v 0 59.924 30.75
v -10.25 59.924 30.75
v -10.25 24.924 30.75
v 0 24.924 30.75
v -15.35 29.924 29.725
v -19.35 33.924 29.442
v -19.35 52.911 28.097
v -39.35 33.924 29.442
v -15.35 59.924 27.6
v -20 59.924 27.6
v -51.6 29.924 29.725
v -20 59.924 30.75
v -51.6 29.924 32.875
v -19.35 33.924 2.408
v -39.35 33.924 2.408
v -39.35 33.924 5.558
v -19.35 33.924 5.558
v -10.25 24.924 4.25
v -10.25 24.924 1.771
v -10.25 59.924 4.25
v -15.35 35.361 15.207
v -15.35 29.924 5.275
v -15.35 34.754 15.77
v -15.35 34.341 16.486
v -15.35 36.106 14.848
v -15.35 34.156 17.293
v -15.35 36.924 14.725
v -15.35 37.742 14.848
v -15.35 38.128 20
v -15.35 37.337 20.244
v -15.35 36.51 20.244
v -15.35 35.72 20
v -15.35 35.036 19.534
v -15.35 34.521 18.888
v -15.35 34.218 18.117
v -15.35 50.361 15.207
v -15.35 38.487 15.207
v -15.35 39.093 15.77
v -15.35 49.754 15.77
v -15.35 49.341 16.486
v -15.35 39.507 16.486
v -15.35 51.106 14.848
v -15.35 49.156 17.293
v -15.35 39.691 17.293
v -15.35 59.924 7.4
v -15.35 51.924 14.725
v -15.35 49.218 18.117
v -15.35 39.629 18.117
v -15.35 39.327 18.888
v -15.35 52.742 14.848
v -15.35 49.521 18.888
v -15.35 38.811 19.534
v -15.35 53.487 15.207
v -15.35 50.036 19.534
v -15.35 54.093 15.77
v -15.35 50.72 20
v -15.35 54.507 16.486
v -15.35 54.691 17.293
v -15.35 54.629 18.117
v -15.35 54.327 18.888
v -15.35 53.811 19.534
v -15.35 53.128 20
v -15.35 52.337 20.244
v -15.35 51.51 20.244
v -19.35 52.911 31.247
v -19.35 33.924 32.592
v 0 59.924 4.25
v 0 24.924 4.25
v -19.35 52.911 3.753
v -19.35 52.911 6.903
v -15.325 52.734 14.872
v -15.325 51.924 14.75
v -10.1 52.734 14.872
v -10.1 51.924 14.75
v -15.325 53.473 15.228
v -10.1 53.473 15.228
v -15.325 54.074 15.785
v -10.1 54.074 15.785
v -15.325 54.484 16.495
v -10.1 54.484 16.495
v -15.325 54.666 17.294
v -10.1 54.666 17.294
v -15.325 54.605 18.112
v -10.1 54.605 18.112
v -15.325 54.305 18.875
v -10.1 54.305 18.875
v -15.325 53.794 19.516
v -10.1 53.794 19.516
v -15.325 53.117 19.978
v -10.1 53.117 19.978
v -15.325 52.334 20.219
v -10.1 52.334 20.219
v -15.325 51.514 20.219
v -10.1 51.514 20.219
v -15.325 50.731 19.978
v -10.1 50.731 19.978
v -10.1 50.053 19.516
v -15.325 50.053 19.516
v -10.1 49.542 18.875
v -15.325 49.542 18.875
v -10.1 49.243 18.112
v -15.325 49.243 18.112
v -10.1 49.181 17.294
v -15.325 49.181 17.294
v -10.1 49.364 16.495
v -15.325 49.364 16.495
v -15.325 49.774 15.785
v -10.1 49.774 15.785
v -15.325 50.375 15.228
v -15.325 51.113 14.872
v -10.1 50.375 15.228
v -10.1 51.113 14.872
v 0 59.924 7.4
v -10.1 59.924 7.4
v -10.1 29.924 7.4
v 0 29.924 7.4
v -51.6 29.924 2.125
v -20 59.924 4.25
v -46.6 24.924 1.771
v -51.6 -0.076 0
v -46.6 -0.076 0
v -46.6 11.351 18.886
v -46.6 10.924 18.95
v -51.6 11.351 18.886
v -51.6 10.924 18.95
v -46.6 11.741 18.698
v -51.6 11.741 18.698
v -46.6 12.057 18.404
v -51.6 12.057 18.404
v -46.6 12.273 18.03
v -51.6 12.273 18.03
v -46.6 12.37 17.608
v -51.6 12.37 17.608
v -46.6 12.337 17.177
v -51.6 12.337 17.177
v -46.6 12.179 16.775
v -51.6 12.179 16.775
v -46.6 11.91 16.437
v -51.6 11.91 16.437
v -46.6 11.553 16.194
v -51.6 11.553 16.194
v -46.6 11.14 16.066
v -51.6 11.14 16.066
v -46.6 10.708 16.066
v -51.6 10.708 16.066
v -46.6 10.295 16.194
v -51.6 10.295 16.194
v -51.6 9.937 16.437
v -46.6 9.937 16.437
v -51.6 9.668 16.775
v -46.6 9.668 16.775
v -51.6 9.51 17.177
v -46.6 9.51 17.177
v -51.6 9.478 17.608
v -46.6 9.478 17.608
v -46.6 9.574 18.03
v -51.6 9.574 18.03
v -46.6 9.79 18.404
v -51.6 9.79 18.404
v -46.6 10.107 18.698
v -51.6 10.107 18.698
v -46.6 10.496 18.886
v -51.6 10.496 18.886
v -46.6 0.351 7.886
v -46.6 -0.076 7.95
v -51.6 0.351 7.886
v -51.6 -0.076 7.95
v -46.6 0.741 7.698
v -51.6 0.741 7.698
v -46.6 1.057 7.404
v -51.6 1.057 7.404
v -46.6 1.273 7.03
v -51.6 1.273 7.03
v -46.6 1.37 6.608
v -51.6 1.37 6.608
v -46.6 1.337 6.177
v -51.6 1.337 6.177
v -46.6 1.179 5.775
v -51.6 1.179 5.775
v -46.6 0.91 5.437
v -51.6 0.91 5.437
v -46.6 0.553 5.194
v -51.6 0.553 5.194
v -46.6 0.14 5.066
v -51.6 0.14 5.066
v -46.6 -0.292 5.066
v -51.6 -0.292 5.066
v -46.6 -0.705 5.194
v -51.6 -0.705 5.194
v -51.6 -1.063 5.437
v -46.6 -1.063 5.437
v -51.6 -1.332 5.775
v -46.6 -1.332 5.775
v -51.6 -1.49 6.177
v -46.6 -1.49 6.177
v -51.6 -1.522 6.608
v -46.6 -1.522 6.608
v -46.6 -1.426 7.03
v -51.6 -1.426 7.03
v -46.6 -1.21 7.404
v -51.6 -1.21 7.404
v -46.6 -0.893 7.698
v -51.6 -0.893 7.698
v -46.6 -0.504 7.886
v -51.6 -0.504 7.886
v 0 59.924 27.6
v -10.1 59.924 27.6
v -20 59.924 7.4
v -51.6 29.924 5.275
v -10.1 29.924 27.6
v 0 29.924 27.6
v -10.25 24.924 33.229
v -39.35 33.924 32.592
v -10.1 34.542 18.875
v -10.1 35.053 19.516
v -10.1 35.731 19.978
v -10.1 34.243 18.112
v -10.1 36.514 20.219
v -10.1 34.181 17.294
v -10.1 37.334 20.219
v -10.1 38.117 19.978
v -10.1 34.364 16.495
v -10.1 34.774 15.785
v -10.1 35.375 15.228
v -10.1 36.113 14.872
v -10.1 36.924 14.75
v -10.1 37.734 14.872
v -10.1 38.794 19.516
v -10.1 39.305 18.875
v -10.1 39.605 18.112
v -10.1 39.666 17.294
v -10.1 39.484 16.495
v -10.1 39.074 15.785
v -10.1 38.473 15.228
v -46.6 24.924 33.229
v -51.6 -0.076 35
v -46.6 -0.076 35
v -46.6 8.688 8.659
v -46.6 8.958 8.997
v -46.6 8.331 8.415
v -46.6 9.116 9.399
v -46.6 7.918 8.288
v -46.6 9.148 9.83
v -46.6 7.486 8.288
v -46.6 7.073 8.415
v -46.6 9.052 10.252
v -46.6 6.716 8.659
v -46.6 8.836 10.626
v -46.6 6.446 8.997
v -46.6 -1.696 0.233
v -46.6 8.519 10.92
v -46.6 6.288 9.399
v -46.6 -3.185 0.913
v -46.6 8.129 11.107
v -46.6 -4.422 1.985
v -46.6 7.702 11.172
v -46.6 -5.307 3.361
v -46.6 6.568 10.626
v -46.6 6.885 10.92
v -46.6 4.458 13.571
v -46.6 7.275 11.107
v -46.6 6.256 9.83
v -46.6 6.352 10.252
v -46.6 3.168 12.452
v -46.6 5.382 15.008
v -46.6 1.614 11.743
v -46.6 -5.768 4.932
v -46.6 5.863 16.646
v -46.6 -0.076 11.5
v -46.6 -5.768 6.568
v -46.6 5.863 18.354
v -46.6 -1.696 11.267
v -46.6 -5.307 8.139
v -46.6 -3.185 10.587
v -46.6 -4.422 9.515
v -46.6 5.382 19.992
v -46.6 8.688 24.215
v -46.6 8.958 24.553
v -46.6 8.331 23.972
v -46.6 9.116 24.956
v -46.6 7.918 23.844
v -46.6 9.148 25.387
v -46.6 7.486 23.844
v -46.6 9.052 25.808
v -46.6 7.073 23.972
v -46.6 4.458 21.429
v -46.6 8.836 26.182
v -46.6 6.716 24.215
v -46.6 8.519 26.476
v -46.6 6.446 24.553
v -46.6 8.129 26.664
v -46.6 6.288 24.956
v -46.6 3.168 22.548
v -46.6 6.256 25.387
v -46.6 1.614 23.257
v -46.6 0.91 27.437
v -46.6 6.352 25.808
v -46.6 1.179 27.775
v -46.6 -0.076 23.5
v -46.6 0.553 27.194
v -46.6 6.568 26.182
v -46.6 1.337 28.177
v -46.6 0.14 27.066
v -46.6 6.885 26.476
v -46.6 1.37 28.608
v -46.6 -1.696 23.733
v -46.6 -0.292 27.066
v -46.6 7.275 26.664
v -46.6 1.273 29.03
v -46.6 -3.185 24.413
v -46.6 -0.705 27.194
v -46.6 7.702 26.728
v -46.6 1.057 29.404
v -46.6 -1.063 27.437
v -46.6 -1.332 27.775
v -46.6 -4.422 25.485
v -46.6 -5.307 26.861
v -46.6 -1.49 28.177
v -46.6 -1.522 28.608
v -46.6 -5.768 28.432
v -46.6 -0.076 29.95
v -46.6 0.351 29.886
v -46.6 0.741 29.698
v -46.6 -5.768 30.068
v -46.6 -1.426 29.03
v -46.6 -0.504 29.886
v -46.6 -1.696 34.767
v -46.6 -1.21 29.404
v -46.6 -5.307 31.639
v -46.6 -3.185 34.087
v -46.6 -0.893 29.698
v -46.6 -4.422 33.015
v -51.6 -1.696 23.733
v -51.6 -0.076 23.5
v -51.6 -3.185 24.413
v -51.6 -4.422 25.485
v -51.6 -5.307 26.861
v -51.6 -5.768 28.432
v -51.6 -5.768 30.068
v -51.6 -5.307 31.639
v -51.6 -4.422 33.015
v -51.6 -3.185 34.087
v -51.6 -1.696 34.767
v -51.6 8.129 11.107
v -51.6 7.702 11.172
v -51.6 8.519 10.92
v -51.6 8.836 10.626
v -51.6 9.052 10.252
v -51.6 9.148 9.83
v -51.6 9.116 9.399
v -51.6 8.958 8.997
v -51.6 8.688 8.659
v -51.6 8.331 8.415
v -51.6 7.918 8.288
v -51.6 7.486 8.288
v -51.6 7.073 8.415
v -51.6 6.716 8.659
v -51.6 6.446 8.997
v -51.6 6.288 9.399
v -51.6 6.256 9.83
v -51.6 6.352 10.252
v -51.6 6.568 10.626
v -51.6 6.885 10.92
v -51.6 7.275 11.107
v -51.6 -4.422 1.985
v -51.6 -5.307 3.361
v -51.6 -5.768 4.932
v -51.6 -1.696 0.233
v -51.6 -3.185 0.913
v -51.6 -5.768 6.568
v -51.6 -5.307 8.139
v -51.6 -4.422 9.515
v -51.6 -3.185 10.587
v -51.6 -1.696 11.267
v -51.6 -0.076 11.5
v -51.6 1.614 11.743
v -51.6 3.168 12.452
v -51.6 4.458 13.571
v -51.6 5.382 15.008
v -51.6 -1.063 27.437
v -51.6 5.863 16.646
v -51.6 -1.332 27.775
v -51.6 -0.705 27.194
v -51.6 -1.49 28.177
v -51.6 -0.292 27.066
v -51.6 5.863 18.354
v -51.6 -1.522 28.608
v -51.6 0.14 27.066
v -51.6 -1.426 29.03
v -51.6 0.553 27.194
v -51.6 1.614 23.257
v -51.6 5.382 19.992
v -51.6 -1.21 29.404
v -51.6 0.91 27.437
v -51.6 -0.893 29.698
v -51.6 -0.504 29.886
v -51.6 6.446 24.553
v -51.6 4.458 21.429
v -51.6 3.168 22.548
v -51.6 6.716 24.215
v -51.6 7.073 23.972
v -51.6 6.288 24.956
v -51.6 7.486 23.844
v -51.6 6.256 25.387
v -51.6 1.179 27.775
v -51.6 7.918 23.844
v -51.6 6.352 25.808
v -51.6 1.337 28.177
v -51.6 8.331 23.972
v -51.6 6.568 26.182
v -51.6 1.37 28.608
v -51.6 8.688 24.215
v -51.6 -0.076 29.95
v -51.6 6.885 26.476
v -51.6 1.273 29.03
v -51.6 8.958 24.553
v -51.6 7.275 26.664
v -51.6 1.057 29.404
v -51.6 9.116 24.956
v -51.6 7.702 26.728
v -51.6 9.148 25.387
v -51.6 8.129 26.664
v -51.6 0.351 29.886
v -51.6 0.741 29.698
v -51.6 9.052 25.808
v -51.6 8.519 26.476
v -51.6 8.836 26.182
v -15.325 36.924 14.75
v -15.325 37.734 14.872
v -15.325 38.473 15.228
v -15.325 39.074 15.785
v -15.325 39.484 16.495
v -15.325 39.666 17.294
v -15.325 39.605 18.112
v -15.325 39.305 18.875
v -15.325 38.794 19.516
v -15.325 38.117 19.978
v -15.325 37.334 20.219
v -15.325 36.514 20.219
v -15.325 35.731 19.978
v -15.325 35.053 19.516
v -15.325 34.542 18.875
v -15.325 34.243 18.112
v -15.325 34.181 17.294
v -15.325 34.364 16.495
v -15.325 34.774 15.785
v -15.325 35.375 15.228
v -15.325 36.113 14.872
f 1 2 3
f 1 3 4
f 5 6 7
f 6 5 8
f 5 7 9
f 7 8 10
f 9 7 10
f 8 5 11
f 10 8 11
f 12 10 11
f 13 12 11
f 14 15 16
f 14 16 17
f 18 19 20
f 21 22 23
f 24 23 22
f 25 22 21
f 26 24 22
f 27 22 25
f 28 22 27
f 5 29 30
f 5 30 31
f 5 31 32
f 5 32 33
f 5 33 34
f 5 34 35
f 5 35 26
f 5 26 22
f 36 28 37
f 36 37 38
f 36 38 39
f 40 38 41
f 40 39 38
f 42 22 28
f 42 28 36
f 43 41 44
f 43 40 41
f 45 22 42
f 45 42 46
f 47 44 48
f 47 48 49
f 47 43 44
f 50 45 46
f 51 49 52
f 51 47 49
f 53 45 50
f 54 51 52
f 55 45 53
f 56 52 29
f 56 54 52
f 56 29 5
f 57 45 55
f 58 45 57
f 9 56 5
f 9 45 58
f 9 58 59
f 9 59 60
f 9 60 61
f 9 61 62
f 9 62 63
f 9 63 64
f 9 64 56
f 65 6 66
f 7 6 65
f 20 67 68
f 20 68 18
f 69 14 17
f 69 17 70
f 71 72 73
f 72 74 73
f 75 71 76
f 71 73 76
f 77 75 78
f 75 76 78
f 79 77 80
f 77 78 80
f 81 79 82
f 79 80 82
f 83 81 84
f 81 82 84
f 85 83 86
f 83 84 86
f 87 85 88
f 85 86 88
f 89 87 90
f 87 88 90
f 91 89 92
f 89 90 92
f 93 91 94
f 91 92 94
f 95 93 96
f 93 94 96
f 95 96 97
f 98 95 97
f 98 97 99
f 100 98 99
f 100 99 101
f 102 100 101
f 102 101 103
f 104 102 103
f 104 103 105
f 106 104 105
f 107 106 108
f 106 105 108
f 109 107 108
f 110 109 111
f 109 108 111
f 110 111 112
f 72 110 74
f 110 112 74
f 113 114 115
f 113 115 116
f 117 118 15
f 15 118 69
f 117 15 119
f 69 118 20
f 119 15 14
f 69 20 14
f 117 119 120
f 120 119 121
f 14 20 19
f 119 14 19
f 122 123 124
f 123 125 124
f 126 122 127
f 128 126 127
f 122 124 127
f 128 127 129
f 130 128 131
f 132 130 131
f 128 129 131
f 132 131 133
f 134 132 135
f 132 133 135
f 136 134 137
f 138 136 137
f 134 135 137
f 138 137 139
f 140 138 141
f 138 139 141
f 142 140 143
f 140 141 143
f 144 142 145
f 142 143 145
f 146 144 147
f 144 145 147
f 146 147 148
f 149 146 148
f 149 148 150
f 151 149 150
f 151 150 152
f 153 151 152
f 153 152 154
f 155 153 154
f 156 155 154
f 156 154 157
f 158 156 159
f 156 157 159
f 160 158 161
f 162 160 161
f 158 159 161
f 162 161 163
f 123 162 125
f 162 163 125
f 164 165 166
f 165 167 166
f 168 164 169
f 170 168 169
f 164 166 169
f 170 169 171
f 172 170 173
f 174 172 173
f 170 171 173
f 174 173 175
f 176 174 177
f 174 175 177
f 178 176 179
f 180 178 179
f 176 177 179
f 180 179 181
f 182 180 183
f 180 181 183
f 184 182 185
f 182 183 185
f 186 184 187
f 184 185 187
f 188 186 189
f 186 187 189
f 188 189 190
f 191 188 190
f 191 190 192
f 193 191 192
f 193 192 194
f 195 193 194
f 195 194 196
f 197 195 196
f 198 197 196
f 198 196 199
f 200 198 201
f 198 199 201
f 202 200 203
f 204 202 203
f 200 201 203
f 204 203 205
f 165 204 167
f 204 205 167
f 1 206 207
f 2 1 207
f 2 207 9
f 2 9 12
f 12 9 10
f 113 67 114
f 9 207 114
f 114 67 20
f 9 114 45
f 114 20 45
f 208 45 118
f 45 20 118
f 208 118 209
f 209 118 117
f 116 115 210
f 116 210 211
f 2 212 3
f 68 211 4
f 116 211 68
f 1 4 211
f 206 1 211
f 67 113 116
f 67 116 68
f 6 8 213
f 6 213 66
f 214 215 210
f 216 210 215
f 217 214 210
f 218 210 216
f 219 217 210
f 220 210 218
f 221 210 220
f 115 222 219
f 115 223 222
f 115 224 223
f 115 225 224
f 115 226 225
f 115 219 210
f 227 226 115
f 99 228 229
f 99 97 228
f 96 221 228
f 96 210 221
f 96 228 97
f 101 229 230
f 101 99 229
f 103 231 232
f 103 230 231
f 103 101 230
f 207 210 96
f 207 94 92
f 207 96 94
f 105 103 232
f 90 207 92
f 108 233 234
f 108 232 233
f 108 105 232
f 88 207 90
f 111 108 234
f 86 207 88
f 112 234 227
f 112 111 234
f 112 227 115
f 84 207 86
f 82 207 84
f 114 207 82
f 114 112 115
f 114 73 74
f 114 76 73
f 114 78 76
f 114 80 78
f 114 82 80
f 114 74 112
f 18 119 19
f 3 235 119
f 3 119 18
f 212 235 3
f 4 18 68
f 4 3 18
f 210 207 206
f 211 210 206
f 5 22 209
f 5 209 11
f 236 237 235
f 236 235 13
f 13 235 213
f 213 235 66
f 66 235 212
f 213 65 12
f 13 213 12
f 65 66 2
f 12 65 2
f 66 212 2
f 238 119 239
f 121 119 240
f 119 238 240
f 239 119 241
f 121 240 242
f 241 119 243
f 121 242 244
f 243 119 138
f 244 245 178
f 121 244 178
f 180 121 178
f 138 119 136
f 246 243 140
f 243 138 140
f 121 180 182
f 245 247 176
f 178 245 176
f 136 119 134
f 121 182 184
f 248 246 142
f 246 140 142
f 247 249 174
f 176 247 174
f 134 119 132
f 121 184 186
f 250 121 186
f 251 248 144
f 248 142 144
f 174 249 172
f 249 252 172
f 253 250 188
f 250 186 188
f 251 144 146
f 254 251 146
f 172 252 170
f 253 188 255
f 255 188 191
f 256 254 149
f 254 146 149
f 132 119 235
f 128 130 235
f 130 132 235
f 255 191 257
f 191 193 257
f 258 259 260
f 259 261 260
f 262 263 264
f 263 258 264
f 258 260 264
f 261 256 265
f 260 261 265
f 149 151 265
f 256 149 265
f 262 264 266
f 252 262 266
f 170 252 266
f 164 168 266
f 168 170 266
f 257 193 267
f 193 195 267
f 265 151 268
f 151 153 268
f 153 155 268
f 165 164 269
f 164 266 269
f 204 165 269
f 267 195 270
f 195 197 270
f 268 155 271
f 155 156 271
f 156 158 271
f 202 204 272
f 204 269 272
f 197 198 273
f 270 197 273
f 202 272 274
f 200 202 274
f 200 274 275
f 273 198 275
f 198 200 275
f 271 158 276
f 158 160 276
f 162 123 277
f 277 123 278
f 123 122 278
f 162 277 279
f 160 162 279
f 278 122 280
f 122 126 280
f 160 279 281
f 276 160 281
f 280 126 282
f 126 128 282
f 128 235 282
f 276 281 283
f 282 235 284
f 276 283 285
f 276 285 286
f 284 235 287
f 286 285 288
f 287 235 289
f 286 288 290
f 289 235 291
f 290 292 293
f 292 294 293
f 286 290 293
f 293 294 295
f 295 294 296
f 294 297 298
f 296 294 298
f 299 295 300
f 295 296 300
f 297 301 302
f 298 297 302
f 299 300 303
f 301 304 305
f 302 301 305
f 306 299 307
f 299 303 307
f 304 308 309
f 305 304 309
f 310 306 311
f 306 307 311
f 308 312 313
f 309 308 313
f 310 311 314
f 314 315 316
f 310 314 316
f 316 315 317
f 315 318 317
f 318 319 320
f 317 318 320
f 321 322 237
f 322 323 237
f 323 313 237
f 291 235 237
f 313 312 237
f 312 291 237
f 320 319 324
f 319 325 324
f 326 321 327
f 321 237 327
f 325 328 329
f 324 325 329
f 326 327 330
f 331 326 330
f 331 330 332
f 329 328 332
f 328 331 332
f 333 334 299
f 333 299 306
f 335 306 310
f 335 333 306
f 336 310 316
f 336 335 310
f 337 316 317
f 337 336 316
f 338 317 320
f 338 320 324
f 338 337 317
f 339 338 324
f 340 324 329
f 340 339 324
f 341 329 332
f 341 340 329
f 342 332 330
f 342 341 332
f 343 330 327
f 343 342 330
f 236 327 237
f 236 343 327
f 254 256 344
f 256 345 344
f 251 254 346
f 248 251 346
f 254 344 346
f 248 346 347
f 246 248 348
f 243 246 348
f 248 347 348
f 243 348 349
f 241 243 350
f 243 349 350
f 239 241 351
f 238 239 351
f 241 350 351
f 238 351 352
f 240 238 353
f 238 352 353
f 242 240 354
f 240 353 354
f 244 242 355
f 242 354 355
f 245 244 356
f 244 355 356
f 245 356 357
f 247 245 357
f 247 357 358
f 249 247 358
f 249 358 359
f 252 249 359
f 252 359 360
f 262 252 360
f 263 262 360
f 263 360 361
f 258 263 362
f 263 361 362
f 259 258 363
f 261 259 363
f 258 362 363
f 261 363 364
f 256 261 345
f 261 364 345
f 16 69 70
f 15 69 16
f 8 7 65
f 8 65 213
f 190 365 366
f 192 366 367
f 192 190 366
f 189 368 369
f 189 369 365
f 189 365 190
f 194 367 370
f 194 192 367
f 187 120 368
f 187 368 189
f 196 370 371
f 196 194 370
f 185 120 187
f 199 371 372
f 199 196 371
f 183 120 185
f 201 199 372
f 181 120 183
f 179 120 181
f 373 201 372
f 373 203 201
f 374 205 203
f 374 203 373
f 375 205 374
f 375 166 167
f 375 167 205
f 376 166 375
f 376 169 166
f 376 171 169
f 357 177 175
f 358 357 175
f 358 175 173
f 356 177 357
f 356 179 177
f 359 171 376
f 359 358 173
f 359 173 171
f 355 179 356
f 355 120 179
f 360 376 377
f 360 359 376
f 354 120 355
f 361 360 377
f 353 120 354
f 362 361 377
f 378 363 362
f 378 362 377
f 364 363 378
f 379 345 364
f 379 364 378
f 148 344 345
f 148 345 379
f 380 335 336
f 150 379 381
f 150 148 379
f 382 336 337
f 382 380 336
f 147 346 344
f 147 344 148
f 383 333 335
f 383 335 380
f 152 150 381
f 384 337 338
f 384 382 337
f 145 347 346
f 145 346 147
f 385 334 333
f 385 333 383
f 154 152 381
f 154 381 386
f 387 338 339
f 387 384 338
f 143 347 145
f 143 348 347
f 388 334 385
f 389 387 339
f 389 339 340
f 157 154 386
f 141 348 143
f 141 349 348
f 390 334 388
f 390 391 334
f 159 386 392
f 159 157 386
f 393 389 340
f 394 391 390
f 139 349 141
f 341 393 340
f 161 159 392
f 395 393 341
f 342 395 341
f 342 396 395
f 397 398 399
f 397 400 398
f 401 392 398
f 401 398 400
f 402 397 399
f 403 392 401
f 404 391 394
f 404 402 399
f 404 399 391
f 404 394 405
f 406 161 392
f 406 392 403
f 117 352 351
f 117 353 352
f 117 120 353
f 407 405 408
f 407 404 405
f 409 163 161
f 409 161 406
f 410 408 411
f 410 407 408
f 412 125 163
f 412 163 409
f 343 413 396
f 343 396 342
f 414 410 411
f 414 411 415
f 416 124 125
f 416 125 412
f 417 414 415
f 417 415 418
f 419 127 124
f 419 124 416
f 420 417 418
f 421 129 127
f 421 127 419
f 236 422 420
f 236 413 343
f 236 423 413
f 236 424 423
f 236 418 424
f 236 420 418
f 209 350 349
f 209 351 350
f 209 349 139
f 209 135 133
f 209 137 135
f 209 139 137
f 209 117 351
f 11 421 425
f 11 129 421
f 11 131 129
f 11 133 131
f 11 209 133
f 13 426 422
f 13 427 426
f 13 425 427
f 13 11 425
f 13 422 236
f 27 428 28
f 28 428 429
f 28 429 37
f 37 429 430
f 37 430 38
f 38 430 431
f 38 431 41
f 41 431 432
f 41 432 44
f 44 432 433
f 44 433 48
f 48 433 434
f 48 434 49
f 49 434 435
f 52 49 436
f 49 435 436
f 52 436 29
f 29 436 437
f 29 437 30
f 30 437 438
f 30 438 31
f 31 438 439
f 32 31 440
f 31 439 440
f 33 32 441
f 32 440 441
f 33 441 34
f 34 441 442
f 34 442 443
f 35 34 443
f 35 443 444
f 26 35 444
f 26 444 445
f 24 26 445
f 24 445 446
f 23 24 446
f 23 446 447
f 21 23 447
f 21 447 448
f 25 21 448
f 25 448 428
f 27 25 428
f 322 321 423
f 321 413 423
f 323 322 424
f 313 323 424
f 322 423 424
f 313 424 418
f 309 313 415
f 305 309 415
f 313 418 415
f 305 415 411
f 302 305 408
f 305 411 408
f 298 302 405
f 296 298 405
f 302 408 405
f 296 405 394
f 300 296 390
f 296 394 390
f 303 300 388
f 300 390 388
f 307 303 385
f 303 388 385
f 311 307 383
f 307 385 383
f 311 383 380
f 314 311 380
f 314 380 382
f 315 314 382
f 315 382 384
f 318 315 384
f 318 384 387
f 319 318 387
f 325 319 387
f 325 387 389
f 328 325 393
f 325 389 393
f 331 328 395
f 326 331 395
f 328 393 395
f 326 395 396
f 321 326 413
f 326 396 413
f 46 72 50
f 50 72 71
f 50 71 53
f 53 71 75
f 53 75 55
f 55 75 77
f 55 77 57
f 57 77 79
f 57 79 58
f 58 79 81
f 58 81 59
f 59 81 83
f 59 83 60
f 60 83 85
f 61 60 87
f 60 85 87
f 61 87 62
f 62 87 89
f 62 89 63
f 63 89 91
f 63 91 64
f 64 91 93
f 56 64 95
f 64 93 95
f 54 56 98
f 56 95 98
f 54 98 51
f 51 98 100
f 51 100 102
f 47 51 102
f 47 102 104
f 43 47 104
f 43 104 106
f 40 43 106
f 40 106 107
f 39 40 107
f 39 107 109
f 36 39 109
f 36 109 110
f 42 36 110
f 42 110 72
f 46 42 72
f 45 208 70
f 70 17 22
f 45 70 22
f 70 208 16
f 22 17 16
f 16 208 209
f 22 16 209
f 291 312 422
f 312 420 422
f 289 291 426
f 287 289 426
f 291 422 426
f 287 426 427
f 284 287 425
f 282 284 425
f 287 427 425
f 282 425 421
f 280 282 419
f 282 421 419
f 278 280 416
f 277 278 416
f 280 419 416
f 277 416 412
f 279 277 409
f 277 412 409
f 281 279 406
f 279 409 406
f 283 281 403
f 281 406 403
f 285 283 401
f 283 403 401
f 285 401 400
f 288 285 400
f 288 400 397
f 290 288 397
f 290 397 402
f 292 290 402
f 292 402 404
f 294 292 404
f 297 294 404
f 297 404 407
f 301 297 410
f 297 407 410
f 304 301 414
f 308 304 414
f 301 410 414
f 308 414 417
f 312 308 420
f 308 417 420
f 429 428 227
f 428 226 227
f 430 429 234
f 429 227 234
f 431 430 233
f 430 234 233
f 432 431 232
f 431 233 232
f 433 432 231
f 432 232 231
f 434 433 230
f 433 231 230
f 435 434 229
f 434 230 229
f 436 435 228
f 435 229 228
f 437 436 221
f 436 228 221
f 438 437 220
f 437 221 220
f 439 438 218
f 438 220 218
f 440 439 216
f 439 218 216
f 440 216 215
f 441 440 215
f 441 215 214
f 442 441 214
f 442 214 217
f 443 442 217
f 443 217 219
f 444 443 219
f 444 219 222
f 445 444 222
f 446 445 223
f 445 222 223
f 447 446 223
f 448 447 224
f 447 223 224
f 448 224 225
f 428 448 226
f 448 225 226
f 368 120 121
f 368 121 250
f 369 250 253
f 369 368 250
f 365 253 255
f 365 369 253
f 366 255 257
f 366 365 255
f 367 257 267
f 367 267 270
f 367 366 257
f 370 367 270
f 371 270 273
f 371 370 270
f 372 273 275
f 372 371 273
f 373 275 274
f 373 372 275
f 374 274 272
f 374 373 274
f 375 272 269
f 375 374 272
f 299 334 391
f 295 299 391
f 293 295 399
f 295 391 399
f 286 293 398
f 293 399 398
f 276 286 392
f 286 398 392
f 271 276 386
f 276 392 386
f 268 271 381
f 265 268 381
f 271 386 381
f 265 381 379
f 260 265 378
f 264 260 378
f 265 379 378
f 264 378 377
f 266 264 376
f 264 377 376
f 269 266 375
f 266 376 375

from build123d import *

# Parameters (mm, degrees)
EXTRUDE_1_DEPTH                  = 35
SKETCH_6_R                       = 6
CUT_EXTRUDE_2_DEPTH              = 103.2
SKETCH_7_R                       = 5.75
EXTRUDE_3_DEPTH                  = 103.2
CUT_EXTRUDE_3_REACH              = 88.478
M2_5_CLEARANCE_HOLE1_D           = 2.9
M2_5_CLEARANCE_HOLE1_CSINK_D     = 2.95
M2_5_CLEARANCE_HOLE1_CSINK_ANGLE = 90
SKETCH_16_W                      = 20.2
SKETCH_16_H                      = 20.2
CUT_EXTRUDE_5_DEPTH              = 30
SKETCH_15_W                      = 20.5
SKETCH_15_H                      = 35
CUT_EXTRUDE_6_DEPTH              = 4.25
SKETCH_17_W                      = 20.5
SKETCH_17_H                      = 35
CUT_EXTRUDE_7_DEPTH              = 4.25
CUT_EXTRUDE_8_REACH              = 126.363
CUT_EXTRUDE_9_DEPTH              = 36.25
CUT_EXTRUDE_10_DEPTH             = 36.25
CUT_EXTRUDE_12_DEPTH             = 87.477815158
CUT_EXTRUDE1_START               = -51.6
SKETCH1_W                        = 50
SKETCH1_H                        = 80
CUT_EXTRUDE1_DEPTH               = 51.6
M5_CLEARANCE_HOLE2_D             = 5.5
M5_CLEARANCE_HOLE2_CSINK_D       = 5.55
M5_CLEARANCE_HOLE2_CSINK_ANGLE   = 90


with BuildPart() as part:
    # 草图1 → 凸台-拉伸1 (new body)
    with BuildSketch(Plane.XY):
        Polygon((51.6, -0.076277531), (51.6, 29.923722469), (20, 59.923722469), (-20, 59.923722469), (-51.6, 29.923722469), (-51.6, -0.076277531), align=None)
    extrude(amount=EXTRUDE_1_DEPTH)

    # 草图6 → 切除-拉伸2 (cut)
    with BuildSketch(Plane.ZY.offset(51.6)):
        with Locations((17.5, -0.076277531)):
            Circle(SKETCH_6_R)
    extrude(amount=-CUT_EXTRUDE_2_DEPTH, mode=Mode.SUBTRACT)

    # 草图7 → 凸台-拉伸3 (add)
    with BuildSketch(Plane.ZY.offset(51.6)):
        with Locations((5.75, -0.076277531)):
            Circle(SKETCH_7_R)
        with Locations((29.25, -0.076277531)):
            Circle(SKETCH_7_R)
    extrude(amount=-EXTRUDE_3_DEPTH)

    # 切除-拉伸3: up to this face of the body (flat: up to its plane)
    cut_extrude_3_end = Plane(part.part.faces().sort_by_distance((0, 26.308161829, 0))[0])
    # 草图8 → 切除-拉伸3 (cut, up to the picked face)
    with BuildSketch(Plane.XY.offset(35), mode=Mode.PRIVATE) as cut_extrude_3_sk1:
        Polygon((-46.6, -0.076277531), (-46.6, 24.923722469), (46.6, 24.923722469), (46.6, -0.076277531), (46.6, -12.111349377), (-46.6, -12.111349377), align=None)
    cut_extrude_3_tool1 = split(extrude(cut_extrude_3_sk1.sketch, amount=-CUT_EXTRUDE_3_REACH, mode=Mode.PRIVATE), bisect_by=cut_extrude_3_end, keep=Keep.BOTH, mode=Mode.PRIVATE)
    add(cut_extrude_3_tool1.solids().sort_by(Axis((0, 6.406187, 35), (0, 0, -1)))[0], mode=Mode.SUBTRACT)

    # M2.5 Clearance Hole1 (through all)
    with Locations(Plane(origin=(51.6, 0, 0), x_dir=(0, 0, -1), z_dir=(1, 0, 0))):
        with Locations((-28.5, -0.076277531), (-25.278174593, 7.701897062), (-17.5, 10.923722469), (-9.721825407, 7.701897062), (-6.5, -0.076277531)):
            CounterSinkHole(M2_5_CLEARANCE_HOLE1_D / 2, M2_5_CLEARANCE_HOLE1_CSINK_D / 2, counter_sink_angle=M2_5_CLEARANCE_HOLE1_CSINK_ANGLE)

    # 草图16 → 切除-拉伸5 (cut)
    with BuildSketch(Plane(origin=(0, 59.923722469, 0), x_dir=(1, 0, 0), z_dir=(0, 1, 0))):
        with Locations((0, -17.5)):
            Rectangle(SKETCH_16_W, SKETCH_16_H)
    extrude(amount=-CUT_EXTRUDE_5_DEPTH, mode=Mode.SUBTRACT)

    # 草图15 → 切除-拉伸6 (cut)
    with BuildSketch(Plane.XY.offset(35)):
        with Locations((0, 42.423722469)):
            Rectangle(SKETCH_15_W, SKETCH_15_H)
    extrude(amount=-CUT_EXTRUDE_6_DEPTH, mode=Mode.SUBTRACT)

    # 草图17 → 切除-拉伸7 (cut)
    with BuildSketch(Plane(origin=(0, 0, 0), x_dir=(-1, 0, 0), z_dir=(0, 0, -1))):
        with Locations((0, 42.423722469)):
            Rectangle(SKETCH_17_W, SKETCH_17_H)
    extrude(amount=-CUT_EXTRUDE_7_DEPTH, mode=Mode.SUBTRACT)

    # 切除-拉伸8: up to this face of the body (flat: up to its plane)
    cut_extrude_8_end = Plane(part.part.faces().sort_by_distance((-51.6, 14.183980779, 17.5))[0])
    # 草图20 → 切除-拉伸8 (cut, up to the picked face)
    with BuildSketch(Plane(origin=(51.6, 0, 0), x_dir=(0, 0, -1), z_dir=(1, 0, 0)), mode=Mode.PRIVATE) as cut_extrude_8_sk1:
        Polygon((-30.75, 59.923722469), (-35, 59.923722469), (-35, -0.076277531), align=None)
    cut_extrude_8_tool1 = split(extrude(cut_extrude_8_sk1.sketch, amount=-CUT_EXTRUDE_8_REACH, mode=Mode.PRIVATE), bisect_by=cut_extrude_8_end, keep=Keep.BOTH, mode=Mode.PRIVATE)
    # 草图20 → 切除-拉伸8 (cut, up to the picked face)
    with BuildSketch(Plane(origin=(51.6, 0, 0), x_dir=(0, 0, -1), z_dir=(1, 0, 0)), mode=Mode.PRIVATE) as cut_extrude_8_sk2:
        Polygon((0, -0.076277531), (0, 59.923722469), (-4.25, 59.923722469), align=None)
    cut_extrude_8_tool2 = split(extrude(cut_extrude_8_sk2.sketch, amount=-CUT_EXTRUDE_8_REACH, mode=Mode.PRIVATE), bisect_by=cut_extrude_8_end, keep=Keep.BOTH, mode=Mode.PRIVATE)
    add(cut_extrude_8_tool1.solids().sort_by(Axis((51.6, 39.923722, 33.583333), (-1, 0, 0)))[0], mode=Mode.SUBTRACT)
    add(cut_extrude_8_tool2.solids().sort_by(Axis((51.6, 39.923722, 1.416667), (-1, 0, 0)))[0], mode=Mode.SUBTRACT)

    # 草图21 → 切除-拉伸9 (cut)
    with BuildSketch(Plane(origin=(51.6, 0, 0), x_dir=(0, 0, -1), z_dir=(1, 0, 0))):
        Polygon((-27.6, 59.923722469), (-29.725, 29.923722469), (-5.275, 29.923722469), (-7.4, 59.923722469), align=None)
    extrude(amount=-CUT_EXTRUDE_9_DEPTH, mode=Mode.SUBTRACT)

    # 草图22 → 切除-拉伸10 (cut)
    with BuildSketch(Plane.ZY.offset(51.6)):
        Polygon((29.725, 29.923722469), (27.6, 59.923722469), (7.4, 59.923722469), (5.275, 29.923722469), align=None)
    extrude(amount=-CUT_EXTRUDE_10_DEPTH, mode=Mode.SUBTRACT)

    # 草图25 → 切除-拉伸12 (cut, through all)
    with BuildSketch(Plane.XY):
        Polygon((39.35, 33.923722469), (19.35, 33.923722469), (19.35, 52.911064241), align=None)
        Polygon((-19.35, 52.911064241), (-39.35, 33.923722469), (-19.35, 33.923722469), align=None)
    extrude(amount=CUT_EXTRUDE_12_DEPTH, mode=Mode.SUBTRACT)

    # Sketch1 → Cut-Extrude1 (cut)
    with BuildSketch(Plane(origin=(51.6, 0, 0), x_dir=(0, 0, -1), z_dir=(1, 0, 0)).offset(CUT_EXTRUDE1_START)):
        with Locations((-17.5, 29.923722469)):
            Rectangle(SKETCH1_W, SKETCH1_H)
    extrude(amount=CUT_EXTRUDE1_DEPTH, mode=Mode.SUBTRACT)

    # M5 Clearance Hole2 (through all)
    with Locations(Plane.ZY.offset(15.35)):
        with Locations((17.5, 36.923722469), (17.5, 51.923722469)):
            CounterSinkHole(M5_CLEARANCE_HOLE2_D / 2, M5_CLEARANCE_HOLE2_CSINK_D / 2, counter_sink_angle=M5_CLEARANCE_HOLE2_CSINK_ANGLE)


solid = part.part
